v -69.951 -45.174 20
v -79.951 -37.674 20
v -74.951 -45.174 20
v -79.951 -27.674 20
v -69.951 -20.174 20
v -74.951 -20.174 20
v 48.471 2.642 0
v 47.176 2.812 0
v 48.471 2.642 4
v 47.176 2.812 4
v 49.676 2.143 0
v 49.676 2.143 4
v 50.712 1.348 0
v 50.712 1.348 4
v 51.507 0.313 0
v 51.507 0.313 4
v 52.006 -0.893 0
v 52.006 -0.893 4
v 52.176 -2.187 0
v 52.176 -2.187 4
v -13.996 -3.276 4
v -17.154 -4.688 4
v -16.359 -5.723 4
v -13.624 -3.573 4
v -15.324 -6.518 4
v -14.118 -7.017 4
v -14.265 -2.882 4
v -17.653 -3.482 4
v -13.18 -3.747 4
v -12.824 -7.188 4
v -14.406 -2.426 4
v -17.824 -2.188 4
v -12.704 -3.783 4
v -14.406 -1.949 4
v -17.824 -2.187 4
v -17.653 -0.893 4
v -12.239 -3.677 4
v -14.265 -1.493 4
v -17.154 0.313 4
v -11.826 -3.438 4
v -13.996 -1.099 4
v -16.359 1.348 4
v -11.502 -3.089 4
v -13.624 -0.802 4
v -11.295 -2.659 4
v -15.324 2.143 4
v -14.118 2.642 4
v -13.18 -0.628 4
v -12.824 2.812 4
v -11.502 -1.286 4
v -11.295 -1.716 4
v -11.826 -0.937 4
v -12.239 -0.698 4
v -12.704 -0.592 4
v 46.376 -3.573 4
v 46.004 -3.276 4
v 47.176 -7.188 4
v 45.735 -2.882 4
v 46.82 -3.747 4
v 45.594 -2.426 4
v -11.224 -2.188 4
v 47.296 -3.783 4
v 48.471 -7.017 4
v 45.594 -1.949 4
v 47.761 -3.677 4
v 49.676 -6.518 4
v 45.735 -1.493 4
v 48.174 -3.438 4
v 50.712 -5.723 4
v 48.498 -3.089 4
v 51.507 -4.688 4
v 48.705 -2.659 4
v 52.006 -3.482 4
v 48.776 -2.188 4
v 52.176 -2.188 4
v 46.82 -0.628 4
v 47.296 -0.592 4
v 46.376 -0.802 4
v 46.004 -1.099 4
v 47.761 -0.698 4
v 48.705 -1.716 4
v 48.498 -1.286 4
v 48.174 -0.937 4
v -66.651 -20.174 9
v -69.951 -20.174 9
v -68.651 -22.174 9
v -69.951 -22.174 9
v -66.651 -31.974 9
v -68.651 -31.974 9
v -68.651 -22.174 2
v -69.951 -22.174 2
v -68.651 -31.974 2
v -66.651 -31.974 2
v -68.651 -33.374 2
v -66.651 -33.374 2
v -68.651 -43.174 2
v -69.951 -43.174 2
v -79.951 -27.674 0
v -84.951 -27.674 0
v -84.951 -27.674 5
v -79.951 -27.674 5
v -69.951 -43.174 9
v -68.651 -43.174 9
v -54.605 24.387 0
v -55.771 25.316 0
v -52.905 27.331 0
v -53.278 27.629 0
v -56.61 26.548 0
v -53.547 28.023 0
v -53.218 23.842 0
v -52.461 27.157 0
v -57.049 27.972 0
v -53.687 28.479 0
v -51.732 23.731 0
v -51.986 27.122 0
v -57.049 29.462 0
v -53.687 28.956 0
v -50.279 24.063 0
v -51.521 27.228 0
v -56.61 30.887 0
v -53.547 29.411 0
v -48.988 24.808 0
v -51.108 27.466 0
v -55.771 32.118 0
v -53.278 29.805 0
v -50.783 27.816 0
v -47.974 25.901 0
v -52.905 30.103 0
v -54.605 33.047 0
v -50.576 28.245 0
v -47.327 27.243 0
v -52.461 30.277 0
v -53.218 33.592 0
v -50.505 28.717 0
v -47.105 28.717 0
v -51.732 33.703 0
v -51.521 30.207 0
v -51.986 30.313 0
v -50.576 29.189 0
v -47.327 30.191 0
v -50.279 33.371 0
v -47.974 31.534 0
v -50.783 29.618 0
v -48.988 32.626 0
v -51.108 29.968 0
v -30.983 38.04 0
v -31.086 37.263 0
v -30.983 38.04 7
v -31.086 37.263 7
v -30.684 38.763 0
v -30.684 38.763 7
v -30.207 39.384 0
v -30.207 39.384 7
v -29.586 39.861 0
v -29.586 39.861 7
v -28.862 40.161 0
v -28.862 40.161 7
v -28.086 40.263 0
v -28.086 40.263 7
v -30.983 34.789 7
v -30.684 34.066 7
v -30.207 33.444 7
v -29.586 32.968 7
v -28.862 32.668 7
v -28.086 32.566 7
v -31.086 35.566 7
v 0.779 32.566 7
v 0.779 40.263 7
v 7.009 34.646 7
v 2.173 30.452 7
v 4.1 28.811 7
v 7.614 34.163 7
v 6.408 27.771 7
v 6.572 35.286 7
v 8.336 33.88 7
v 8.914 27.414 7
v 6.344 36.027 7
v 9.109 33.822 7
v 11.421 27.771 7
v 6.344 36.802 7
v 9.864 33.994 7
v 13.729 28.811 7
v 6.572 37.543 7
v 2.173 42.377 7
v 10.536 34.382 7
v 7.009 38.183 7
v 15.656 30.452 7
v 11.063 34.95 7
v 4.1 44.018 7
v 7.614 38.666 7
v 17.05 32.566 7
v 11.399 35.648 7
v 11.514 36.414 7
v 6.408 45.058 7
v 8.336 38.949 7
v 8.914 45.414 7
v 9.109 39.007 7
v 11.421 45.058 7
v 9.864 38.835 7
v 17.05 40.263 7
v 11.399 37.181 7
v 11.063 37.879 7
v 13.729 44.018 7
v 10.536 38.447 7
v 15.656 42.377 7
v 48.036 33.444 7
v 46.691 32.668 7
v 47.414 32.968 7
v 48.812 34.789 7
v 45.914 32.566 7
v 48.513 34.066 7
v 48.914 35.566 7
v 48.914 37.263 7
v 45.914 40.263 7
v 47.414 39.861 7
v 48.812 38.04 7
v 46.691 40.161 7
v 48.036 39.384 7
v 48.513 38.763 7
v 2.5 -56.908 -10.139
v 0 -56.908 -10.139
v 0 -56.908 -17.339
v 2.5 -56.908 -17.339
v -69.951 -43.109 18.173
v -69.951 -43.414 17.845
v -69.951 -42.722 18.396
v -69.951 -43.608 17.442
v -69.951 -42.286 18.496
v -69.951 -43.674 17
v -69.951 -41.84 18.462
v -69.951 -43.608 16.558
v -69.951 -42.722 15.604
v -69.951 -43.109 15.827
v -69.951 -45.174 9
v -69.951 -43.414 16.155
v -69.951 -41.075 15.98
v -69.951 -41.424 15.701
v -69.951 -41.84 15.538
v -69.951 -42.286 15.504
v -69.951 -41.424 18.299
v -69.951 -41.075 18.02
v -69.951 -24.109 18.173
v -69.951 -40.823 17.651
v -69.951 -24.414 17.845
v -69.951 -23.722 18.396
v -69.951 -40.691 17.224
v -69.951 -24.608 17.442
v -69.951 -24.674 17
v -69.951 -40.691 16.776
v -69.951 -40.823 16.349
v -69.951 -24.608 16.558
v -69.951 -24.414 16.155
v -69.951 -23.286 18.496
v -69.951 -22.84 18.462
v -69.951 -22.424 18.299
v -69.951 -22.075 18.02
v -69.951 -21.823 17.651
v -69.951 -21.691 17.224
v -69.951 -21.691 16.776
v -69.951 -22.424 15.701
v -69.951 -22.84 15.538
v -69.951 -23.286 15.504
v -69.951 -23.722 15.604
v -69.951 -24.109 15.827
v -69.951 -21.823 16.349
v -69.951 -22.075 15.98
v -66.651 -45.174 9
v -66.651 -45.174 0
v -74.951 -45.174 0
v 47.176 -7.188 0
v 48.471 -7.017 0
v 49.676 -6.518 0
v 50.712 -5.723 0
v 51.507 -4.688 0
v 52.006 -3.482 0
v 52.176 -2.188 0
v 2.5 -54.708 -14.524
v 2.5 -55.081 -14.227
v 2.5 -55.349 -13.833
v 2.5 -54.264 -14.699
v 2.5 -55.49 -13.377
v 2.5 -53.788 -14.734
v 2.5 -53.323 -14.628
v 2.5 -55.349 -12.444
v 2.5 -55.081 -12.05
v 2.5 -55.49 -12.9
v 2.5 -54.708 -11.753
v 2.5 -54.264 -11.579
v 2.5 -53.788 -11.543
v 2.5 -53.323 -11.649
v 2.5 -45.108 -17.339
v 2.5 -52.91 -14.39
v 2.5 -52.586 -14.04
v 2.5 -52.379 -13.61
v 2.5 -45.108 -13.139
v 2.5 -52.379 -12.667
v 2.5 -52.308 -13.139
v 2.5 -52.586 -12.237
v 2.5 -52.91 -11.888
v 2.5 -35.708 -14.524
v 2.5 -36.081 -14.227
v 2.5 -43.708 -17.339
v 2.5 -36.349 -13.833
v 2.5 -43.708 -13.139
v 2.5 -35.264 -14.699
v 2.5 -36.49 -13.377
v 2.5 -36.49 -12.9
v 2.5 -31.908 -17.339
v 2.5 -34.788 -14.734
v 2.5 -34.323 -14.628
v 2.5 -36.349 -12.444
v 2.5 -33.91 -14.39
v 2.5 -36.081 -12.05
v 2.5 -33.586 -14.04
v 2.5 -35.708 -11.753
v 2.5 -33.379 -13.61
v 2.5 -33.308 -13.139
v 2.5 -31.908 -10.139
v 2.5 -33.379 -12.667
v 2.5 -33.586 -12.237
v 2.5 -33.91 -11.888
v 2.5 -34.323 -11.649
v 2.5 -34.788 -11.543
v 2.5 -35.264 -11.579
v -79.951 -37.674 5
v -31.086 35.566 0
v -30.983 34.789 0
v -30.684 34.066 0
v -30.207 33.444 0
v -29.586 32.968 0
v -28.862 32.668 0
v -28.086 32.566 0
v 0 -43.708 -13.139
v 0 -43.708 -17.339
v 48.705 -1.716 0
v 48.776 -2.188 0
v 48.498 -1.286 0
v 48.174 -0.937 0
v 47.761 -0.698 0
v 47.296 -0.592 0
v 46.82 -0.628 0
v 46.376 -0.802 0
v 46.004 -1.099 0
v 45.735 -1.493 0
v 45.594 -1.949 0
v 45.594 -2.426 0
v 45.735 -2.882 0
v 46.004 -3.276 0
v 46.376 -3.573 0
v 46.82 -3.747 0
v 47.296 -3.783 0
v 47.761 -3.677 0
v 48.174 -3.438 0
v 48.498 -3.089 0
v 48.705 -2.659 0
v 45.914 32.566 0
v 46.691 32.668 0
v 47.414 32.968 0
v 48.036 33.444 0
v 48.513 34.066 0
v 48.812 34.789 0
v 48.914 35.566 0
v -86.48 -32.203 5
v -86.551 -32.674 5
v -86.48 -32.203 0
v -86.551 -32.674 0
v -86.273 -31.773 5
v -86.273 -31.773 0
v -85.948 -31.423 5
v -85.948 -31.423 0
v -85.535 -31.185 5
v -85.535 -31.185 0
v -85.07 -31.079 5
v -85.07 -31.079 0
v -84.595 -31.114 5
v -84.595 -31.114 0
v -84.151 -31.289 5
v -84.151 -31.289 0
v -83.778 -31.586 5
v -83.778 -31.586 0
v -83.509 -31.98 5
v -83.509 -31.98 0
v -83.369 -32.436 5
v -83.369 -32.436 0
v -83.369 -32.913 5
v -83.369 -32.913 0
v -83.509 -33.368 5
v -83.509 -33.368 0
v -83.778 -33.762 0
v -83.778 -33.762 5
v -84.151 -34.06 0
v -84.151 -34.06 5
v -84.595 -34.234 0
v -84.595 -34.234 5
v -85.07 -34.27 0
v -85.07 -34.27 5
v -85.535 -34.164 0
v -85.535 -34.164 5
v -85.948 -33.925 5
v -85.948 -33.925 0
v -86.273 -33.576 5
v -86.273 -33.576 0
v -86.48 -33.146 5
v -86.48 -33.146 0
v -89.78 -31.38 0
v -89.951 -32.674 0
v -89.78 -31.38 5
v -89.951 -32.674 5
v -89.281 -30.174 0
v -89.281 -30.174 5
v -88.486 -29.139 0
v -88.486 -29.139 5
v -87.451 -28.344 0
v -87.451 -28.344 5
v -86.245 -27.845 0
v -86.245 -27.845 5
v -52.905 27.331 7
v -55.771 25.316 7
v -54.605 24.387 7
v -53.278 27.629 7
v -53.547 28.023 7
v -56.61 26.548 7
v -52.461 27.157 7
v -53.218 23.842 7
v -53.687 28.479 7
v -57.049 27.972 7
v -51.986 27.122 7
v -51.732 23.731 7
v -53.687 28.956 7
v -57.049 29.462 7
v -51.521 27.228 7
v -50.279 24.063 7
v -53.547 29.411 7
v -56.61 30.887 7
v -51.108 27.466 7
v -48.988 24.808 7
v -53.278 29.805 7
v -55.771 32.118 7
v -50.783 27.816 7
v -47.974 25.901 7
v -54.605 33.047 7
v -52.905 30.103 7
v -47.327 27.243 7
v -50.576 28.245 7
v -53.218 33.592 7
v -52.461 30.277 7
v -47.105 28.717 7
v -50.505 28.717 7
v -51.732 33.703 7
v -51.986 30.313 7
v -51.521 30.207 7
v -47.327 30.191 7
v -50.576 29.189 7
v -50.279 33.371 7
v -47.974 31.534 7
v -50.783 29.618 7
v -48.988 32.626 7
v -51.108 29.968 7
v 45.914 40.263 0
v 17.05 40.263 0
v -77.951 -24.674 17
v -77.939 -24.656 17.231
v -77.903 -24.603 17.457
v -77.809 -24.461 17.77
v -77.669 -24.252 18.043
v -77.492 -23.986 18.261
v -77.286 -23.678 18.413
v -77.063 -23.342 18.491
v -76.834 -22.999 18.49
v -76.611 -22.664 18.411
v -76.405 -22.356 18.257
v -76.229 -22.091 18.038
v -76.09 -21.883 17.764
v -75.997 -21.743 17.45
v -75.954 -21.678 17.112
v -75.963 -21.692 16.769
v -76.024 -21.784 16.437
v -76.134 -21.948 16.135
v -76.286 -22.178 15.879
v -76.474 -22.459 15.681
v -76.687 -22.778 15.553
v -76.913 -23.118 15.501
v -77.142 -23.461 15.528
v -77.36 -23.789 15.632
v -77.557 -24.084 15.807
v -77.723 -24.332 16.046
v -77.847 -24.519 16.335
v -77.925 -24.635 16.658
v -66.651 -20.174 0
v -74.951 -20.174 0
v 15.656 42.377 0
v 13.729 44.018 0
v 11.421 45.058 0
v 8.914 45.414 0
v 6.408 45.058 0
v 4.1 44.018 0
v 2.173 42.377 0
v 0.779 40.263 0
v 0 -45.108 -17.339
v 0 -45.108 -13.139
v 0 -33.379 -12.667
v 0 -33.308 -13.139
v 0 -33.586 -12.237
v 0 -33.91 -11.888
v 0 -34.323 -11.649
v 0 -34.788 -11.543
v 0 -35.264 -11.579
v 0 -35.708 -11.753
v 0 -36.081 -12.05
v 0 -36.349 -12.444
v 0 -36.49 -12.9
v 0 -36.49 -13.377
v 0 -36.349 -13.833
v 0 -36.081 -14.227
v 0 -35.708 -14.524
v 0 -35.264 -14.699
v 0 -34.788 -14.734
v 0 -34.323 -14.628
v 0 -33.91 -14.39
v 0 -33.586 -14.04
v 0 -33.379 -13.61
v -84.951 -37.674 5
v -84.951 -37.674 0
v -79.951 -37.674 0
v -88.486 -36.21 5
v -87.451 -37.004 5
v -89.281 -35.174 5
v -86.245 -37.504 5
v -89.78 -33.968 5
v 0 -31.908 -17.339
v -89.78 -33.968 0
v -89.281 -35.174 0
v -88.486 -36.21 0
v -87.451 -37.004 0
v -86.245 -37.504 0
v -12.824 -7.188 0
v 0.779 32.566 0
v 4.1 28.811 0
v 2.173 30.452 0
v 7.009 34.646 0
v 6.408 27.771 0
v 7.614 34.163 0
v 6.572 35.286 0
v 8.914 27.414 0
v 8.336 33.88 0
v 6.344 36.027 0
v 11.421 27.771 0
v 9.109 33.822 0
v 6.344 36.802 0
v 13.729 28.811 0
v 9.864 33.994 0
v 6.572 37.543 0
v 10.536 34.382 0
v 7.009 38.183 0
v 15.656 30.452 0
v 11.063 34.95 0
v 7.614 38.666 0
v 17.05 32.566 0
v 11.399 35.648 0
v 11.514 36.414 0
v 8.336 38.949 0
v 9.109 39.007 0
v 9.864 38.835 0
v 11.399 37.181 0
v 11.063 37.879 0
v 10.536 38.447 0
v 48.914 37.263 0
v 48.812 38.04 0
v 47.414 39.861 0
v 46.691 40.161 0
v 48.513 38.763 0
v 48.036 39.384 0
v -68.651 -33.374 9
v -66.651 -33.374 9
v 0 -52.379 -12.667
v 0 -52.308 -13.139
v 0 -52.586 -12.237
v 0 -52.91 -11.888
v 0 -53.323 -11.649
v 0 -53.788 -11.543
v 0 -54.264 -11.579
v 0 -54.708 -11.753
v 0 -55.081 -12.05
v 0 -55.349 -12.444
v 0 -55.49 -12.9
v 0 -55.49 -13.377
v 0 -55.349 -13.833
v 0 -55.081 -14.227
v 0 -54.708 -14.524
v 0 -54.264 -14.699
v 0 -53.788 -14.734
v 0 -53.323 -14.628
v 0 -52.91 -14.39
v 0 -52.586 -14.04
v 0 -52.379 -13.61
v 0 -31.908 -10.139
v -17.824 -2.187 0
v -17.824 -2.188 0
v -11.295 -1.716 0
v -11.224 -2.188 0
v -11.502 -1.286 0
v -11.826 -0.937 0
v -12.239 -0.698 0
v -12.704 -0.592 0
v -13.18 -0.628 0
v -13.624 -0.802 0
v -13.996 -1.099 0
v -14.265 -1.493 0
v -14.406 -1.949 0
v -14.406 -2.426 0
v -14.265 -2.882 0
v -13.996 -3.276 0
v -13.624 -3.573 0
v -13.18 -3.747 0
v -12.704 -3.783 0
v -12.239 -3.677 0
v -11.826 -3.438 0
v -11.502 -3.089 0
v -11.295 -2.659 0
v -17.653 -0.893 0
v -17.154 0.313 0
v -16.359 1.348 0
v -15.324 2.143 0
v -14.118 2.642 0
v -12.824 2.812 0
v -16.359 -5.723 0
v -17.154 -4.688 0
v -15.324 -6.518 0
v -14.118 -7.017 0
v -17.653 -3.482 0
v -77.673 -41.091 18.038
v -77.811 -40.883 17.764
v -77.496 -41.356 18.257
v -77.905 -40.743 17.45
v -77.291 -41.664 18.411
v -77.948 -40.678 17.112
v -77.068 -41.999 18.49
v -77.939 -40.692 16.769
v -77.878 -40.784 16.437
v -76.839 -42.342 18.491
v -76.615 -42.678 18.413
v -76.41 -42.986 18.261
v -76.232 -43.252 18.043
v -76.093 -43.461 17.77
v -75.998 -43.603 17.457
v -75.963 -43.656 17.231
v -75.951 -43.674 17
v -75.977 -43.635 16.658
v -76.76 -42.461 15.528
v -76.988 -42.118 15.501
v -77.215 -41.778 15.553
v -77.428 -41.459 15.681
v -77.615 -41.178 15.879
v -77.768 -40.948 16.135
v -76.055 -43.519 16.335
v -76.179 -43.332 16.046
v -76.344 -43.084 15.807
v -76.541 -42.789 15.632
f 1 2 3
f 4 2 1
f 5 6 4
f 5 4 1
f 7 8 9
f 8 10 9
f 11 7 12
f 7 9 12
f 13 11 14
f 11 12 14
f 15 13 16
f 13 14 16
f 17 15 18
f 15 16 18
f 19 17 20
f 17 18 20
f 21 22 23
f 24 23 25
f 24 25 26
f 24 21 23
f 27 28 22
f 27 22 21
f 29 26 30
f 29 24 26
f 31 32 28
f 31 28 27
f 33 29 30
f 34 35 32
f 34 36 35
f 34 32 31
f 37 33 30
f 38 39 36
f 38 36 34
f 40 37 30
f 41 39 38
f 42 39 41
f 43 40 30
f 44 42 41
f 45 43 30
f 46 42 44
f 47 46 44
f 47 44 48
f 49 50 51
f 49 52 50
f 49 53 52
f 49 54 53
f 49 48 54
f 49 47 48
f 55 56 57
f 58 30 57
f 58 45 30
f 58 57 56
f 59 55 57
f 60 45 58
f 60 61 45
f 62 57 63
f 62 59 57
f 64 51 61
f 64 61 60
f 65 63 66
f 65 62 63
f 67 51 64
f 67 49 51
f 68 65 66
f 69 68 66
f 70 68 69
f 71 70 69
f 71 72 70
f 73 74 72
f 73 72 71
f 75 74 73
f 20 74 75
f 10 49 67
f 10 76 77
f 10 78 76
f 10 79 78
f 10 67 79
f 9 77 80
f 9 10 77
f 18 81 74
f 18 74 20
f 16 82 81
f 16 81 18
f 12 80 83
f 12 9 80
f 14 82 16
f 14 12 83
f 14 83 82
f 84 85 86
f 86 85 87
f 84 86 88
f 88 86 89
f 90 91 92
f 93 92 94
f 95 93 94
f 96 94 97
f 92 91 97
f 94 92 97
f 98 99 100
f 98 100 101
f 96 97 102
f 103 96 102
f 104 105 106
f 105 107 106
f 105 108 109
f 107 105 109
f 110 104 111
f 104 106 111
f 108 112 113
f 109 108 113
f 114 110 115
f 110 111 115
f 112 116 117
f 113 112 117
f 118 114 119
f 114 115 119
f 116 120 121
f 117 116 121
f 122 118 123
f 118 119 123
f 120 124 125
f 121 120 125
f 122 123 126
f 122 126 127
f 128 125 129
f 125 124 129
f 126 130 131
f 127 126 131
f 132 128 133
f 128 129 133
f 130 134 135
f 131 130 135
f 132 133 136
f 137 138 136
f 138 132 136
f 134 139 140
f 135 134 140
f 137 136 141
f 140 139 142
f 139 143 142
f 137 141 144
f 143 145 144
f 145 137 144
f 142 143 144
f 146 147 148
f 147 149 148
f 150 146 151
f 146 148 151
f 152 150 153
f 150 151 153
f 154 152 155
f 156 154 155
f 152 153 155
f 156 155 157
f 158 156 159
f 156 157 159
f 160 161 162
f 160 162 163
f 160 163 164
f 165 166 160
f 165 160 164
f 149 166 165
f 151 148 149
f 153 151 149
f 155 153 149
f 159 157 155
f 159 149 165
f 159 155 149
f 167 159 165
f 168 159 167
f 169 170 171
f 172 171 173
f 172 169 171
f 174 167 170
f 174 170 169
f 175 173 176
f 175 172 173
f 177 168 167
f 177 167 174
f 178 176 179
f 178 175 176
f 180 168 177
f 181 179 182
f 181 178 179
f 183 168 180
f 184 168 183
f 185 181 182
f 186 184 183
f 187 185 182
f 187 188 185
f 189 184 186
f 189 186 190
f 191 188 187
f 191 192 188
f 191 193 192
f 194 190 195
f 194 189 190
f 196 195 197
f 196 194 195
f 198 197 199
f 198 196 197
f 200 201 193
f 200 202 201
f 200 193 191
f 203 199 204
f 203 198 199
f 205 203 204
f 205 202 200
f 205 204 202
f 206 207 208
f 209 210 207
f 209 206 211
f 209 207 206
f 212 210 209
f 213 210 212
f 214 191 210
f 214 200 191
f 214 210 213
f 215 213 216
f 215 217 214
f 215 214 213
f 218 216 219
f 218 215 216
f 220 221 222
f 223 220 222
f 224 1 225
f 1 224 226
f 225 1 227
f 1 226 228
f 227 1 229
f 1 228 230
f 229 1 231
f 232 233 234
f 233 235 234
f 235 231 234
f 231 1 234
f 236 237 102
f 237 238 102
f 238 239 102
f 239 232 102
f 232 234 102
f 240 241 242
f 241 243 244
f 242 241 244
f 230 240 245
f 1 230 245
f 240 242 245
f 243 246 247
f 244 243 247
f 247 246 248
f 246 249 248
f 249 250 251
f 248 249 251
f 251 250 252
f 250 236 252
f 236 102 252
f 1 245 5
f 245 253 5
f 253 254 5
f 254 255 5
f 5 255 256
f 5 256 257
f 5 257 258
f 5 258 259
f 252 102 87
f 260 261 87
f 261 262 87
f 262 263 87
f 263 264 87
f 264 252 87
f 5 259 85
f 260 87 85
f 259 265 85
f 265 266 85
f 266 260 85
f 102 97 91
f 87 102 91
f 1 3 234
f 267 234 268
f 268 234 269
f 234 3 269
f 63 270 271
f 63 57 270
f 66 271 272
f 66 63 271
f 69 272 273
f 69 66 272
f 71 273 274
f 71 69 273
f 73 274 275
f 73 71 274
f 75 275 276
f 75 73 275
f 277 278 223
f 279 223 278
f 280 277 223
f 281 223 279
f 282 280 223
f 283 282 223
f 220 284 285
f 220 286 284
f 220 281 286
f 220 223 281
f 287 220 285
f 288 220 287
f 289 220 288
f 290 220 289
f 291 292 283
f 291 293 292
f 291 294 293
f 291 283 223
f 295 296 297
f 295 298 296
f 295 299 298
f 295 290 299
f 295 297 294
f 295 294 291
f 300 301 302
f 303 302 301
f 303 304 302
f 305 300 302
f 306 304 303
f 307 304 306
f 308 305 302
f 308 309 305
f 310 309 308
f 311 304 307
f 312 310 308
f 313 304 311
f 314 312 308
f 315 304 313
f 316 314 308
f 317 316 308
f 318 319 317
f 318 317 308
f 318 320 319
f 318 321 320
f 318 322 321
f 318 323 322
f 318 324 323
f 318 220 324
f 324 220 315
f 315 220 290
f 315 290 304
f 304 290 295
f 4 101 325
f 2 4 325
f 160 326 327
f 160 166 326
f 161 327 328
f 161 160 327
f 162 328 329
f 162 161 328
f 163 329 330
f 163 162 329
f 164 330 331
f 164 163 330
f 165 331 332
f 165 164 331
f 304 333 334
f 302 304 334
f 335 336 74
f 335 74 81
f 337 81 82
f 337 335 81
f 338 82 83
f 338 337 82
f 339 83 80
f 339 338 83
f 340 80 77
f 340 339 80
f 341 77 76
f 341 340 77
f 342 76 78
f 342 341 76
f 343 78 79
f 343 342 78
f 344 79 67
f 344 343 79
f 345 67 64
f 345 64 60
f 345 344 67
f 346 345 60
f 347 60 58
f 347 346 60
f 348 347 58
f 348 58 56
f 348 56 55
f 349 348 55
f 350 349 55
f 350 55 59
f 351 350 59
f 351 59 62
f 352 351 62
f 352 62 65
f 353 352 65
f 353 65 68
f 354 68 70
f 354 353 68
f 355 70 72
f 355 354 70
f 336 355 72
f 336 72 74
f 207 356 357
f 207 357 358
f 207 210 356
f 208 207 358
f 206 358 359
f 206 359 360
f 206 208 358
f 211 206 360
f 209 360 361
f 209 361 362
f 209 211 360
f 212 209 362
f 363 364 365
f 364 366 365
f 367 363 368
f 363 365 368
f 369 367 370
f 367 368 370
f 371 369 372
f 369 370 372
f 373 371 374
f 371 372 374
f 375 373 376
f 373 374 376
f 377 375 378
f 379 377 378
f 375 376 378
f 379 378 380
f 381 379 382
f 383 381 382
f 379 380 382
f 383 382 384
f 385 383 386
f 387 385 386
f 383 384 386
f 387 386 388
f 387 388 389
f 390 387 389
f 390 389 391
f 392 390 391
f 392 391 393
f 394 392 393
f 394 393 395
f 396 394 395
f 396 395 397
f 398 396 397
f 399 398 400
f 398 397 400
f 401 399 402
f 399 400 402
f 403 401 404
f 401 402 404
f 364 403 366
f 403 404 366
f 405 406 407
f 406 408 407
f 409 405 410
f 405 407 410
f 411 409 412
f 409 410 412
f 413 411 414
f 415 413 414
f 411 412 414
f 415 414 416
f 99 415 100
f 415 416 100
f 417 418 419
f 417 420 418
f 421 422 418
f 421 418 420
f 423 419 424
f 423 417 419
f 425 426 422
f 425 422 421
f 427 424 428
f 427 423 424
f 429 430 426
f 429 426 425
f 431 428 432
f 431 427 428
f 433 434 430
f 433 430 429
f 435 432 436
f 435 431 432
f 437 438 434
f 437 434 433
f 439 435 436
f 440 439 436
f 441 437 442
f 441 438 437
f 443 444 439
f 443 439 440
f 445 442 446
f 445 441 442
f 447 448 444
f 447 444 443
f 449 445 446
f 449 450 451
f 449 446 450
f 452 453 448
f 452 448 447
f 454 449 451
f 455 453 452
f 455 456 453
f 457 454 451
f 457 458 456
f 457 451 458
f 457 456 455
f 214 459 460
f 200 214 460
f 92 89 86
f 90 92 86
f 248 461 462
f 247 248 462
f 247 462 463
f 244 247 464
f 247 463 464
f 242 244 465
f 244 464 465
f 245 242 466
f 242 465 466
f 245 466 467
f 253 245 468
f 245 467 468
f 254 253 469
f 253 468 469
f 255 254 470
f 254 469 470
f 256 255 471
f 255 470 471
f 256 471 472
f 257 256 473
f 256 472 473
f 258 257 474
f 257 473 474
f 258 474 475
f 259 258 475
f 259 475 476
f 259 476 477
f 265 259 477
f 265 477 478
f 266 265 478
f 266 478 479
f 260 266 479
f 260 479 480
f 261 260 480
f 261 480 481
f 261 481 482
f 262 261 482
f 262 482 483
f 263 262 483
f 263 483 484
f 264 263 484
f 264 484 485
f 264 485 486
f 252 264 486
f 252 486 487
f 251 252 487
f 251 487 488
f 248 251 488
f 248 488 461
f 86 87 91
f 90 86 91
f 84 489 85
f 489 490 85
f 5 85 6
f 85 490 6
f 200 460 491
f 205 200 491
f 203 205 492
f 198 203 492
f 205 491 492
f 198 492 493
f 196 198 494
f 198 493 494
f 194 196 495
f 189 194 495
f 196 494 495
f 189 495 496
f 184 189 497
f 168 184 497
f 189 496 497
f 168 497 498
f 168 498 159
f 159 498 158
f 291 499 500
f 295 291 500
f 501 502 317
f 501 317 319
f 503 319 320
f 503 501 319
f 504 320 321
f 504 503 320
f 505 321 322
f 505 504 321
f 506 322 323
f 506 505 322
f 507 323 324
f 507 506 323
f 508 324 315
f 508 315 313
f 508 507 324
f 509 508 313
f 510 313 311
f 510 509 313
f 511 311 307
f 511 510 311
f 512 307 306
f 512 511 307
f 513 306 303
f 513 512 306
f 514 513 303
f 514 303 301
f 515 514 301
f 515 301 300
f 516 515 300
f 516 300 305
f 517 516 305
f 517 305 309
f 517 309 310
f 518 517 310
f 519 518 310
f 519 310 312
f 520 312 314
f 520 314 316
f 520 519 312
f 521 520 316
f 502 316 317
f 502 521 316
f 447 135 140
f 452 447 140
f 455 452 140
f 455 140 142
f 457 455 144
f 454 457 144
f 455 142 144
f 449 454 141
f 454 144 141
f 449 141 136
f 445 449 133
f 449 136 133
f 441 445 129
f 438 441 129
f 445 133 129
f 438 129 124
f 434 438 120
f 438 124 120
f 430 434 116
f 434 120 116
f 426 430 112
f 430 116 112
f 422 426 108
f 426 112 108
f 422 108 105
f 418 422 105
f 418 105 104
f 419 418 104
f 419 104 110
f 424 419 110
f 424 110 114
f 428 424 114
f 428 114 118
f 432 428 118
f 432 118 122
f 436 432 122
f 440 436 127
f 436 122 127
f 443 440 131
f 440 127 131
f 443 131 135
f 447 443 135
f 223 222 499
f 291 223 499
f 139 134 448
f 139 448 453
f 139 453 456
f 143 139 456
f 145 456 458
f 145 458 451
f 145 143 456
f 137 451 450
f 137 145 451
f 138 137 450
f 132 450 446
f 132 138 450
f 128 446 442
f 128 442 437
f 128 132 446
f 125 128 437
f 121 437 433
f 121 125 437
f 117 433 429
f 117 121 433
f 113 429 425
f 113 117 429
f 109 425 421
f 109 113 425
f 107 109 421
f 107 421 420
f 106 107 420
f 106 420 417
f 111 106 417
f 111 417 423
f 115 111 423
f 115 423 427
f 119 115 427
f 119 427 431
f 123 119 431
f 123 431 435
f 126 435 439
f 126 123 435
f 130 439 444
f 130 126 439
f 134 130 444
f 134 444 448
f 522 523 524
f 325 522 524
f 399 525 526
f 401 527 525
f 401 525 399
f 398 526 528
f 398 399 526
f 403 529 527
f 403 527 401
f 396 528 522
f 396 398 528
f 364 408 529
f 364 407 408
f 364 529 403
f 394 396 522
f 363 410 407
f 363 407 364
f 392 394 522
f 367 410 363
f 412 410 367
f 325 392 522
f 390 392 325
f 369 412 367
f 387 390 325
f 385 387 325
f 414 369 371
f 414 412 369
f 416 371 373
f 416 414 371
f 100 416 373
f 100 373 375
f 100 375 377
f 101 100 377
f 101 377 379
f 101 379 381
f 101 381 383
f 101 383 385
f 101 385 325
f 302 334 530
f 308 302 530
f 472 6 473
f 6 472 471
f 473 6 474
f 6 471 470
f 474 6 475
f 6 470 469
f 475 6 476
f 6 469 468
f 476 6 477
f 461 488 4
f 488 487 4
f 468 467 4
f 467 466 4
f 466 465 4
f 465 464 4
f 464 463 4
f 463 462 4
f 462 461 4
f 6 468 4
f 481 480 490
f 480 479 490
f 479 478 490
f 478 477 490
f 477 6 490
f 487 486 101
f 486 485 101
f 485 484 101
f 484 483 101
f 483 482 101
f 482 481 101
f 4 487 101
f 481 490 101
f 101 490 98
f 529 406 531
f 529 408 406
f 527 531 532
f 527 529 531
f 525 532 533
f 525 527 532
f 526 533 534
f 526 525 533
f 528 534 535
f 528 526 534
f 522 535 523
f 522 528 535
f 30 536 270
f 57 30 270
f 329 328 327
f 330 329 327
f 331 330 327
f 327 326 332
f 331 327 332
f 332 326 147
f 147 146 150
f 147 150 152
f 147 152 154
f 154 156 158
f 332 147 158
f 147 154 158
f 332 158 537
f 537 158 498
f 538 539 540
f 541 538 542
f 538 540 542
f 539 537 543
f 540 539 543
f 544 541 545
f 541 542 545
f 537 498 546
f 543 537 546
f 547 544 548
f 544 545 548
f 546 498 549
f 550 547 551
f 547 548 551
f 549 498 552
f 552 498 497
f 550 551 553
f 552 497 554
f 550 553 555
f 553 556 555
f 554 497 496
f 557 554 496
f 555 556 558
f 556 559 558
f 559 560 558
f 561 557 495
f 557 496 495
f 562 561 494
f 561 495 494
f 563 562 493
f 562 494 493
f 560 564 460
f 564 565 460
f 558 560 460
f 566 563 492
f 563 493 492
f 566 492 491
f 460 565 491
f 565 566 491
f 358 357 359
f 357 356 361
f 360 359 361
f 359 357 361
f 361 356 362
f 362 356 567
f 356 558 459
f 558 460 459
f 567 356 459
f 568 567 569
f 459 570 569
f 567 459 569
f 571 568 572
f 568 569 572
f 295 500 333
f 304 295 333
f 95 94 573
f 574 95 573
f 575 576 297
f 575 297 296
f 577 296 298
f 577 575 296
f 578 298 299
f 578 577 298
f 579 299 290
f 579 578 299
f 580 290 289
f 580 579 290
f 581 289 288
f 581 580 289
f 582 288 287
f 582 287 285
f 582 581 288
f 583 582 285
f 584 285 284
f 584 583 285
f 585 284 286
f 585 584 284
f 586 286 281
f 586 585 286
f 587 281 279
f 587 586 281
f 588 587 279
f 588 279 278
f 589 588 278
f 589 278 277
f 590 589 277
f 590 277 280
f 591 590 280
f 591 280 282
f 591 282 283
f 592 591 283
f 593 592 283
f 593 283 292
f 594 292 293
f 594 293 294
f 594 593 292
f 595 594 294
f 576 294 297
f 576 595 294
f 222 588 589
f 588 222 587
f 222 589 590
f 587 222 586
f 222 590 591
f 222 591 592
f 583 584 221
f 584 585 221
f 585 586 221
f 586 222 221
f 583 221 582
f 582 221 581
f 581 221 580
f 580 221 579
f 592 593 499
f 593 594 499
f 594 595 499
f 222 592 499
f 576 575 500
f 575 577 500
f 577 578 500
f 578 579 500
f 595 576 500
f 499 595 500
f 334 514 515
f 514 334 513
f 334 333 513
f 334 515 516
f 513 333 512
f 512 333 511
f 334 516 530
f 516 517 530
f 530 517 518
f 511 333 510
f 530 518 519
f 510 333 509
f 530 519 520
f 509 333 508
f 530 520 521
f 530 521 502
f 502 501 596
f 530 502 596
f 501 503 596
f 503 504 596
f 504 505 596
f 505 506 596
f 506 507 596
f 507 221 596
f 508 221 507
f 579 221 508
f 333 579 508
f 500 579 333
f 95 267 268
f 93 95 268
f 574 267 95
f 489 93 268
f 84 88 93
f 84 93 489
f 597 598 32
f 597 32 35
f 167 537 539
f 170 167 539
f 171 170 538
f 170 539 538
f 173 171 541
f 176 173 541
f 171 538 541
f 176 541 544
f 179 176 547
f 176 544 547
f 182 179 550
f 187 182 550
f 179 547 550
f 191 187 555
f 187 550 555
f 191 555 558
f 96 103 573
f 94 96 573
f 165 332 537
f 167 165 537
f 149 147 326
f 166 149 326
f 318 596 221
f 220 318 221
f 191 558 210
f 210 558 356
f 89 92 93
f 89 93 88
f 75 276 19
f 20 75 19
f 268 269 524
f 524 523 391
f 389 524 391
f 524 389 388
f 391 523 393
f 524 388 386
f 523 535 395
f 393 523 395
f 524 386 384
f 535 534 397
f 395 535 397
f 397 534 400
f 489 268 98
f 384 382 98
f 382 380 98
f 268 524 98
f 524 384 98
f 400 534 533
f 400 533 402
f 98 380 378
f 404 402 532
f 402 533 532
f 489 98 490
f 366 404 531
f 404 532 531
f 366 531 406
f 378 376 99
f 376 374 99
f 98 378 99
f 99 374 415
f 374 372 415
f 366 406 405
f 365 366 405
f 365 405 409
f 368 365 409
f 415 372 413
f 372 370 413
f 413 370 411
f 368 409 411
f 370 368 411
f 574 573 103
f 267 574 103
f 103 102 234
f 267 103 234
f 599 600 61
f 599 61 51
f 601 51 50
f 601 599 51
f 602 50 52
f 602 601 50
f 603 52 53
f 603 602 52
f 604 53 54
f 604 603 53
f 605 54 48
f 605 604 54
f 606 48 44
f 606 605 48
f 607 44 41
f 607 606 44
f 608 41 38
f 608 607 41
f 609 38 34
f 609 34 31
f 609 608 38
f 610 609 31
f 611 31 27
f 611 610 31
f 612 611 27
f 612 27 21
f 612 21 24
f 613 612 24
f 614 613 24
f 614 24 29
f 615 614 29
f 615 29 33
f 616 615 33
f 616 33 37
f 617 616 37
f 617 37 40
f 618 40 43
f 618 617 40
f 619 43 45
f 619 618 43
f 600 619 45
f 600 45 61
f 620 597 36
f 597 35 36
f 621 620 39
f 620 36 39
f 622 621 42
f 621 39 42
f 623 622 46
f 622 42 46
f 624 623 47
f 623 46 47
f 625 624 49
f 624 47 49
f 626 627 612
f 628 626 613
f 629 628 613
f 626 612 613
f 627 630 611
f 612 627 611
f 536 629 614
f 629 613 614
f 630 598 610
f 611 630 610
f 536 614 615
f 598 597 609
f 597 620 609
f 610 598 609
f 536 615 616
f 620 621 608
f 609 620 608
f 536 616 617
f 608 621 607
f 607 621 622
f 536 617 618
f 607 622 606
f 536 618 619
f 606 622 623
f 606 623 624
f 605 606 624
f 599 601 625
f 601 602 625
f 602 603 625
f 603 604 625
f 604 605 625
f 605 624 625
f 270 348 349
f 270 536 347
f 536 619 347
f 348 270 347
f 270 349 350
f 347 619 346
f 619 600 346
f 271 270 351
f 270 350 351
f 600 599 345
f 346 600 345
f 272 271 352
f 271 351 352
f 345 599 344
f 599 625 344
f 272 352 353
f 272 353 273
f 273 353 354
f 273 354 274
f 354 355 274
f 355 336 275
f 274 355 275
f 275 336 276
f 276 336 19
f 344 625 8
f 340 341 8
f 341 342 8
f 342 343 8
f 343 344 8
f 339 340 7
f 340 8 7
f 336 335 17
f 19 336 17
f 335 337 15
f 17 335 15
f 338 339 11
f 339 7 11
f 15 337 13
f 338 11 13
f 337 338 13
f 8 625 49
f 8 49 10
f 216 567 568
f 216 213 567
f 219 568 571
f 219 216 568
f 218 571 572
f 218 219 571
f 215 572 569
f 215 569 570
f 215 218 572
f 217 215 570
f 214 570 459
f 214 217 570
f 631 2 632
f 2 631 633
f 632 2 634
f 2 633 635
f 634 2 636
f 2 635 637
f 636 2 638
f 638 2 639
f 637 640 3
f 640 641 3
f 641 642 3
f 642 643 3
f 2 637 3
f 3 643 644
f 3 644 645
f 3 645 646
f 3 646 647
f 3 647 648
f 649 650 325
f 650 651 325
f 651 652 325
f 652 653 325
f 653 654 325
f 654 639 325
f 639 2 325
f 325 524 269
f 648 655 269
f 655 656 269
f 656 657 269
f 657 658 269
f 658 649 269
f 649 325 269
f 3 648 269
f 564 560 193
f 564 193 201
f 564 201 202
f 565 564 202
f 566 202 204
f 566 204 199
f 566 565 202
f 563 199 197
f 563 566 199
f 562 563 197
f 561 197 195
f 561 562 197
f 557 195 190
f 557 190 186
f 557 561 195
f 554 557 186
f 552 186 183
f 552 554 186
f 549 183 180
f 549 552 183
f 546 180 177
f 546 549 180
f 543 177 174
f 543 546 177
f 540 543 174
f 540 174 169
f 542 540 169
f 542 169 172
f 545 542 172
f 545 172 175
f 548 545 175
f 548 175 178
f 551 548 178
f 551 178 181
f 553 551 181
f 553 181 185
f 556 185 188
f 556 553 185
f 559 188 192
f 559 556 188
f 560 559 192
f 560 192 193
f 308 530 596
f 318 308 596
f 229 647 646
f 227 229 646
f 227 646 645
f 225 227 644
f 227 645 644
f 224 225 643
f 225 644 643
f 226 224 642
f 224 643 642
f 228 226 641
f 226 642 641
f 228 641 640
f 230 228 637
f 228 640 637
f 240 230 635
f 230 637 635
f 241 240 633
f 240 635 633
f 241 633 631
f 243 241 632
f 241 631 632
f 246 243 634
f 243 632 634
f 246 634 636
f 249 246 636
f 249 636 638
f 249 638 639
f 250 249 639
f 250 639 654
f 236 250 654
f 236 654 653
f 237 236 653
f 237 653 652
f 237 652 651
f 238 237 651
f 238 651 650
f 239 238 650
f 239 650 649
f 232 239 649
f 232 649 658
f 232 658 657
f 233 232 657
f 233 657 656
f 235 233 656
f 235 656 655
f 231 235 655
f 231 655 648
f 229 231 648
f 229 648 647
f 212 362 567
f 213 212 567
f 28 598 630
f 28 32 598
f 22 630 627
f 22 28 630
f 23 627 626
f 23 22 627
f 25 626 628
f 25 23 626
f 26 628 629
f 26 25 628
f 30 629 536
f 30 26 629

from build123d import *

# Parameters (mm, degrees)
F0_W      = 70
F0_H      = 10
F0_R      = 1.6
F1_DEPTH  = 4
F2_R      = 4.99999
F3_R      = 5
F3_R_2    = 1.6
F4_DEPTH  = 7
F7_DEPTH  = 20
F6_W      = 10
F6_H      = 10
F8_DEPTH  = 5
F10_D     = 3.2
F10_DEPTH = 5
F10_TIP   = 0.9613769904
F11_R     = 4.99999
F13_DEPTH = 1.3
F14_W     = 9.8
F14_H     = 7
F15_DEPTH = 2
F16_D     = 3
F16_DEPTH = 10
F16_TIP   = 0.9012909285
F17_R     = 1.6
F18_DEPTH = 2.5
F5_R      = 2.6
F19_DEPTH = 7
F20_R     = 3


# Not quite as in the source:
# - a fillet or chamfer is up to 0.001 mm smaller than in the source, because OpenCascade refuses the exact size


with BuildPart() as f1:
    # F0 (on Top) → F1 (new body)
    with BuildSketch(Plane.XY):
        with Locations((17.1764425881, -2.1875003539)):
            Rectangle(F0_W, F0_H)
        with Locations((-12.8235574119, -2.1875003539)):
            Circle(F0_R, mode=Mode.SUBTRACT)
        with Locations((47.1764425881, -2.1875003539)):
            Circle(F0_R, mode=Mode.SUBTRACT)
    extrude(amount=F1_DEPTH)

    # F2 (radius 5 in the source; OpenCascade refuses exactly that, so slightly less here)
    f2_edges = [f1.edges().sort_by_distance(p)[0] for p in [
        (-17.823557, 2.8125, 2),
        (-17.823557, -7.1875, 2),
        (52.176443, 2.8125, 2),
        (52.176443, -7.1875, 2),
    ]]
    fillet(f2_edges, radius=F2_R)


with BuildPart() as f4:
    # F3 (on Top) → F4 (new body)
    with BuildSketch(Plane.XY):
        with Locations((-52.1052666008, 28.7171080709)):
            Circle(F3_R)
        with Locations((-52.1052666008, 28.7171080709)):
            Circle(F3_R_2, mode=Mode.SUBTRACT)
    extrude(amount=F4_DEPTH)


with BuildPart() as f7:
    # F6 (on Top) → F7 (new body)
    with BuildSketch(Plane.XY):
        Polygon((-74.9508264661, -20.1742056012), (-79.9508264661, -27.6742056012), (-79.9508264661, -37.6742056012), (-74.9508264661, -45.1742056012), (-69.9508264661, -45.1742056012), (-69.9508264661, -20.1742056012), align=None)
    extrude(amount=F7_DEPTH)

    # F6 (on Top) → F8 (join)
    with BuildSketch(Plane.XY):
        with Locations((-84.9508264661, -32.6742056012)):
            Rectangle(F6_W, F6_H)
    extrude(amount=F8_DEPTH)

    # F10
    with Locations(Plane.XY.offset(5)):
        with Locations((-84.9508264661, -32.6742056012)):
            Hole(F10_D / 2, depth=F10_DEPTH)
            with Locations((0, 0, -(F10_DEPTH + F10_TIP / 2))):  # 118° drill point
                Cone(0, F10_D / 2, F10_TIP, mode=Mode.SUBTRACT)

    # F11 (radius 5 in the source; OpenCascade refuses exactly that, so slightly less here)
    f11_edges = [f7.edges().sort_by_distance(p)[0] for p in [
        (-89.950826, -37.674206, 2.5),
        (-89.950826, -27.674206, 2.5),
    ]]
    fillet(f11_edges, radius=F11_R)

    # F12 (on face) → F13 (join)
    with BuildSketch(Plane.YZ.offset(-69.9508264661)):
        Polygon((-43.1742056012, 9), (-45.1742056012, 9), (-45.1742056012, 0), (-20.1742056012, 0), (-20.1742056012, 9), (-22.1742056012, 9), (-22.1742056012, 2), (-43.1742056012, 2), align=None)
    extrude(amount=F13_DEPTH)

    # F14 (on face) → F15 (join)
    with BuildSketch(Plane.YZ.offset(-68.6508264661)):
        Polygon((-43.1742056012, 9), (-45.1742056012, 9), (-45.1742056012, 0), (-20.1742056012, 0), (-20.1742056012, 9), (-22.1742056012, 9), (-22.1742056012, 2), (-31.9742056012, 2), (-33.3742056012, 2), (-43.1742056012, 2), align=None)
        with Locations((-38.2742056012, 5.5)):
            Rectangle(F14_W, F14_H)
        with Locations((-27.0742056012, 5.5)):
            Rectangle(F14_W, F14_H)
    extrude(amount=F15_DEPTH)

    # F16
    with Locations(Plane.YZ.offset(-69.9508264661)):
        with Locations((-42.1742056012, 17), (-23.1742056012, 17)):
            Hole(F16_D / 2, depth=F16_DEPTH)
            with Locations((0, 0, -(F16_DEPTH + F16_TIP / 2))):  # 118° drill point
                Cone(0, F16_D / 2, F16_TIP, mode=Mode.SUBTRACT)


with BuildPart() as f18:
    # F17 (on Right) → F18 (new body)
    with BuildSketch(Plane.YZ):
        Polygon((-31.9078966975, -10.1387043178), (-56.9078966975, -10.1387043178), (-56.9078966975, -17.3387043178), (-45.1078966975, -17.3387043178), (-45.1078966975, -13.1387043178), (-43.7078966975, -13.1387043178), (-43.7078966975, -17.3387043178), (-31.9078966975, -17.3387043178), align=None)
        with Locations((-53.9078966975, -13.1387043178)):
            Circle(F17_R, mode=Mode.SUBTRACT)
        with Locations((-34.9078966975, -13.1387043178)):
            Circle(F17_R, mode=Mode.SUBTRACT)
    extrude(amount=F18_DEPTH)


with BuildPart() as f19:
    # F5 (on Top) → F19 (new body)
    with BuildSketch(Plane.XY):
        with BuildLine():
            ThreePointArc((0.7788947706, 32.5657874346), (-0.0855284333, 36.4144742489), (0.7788947706, 40.2631610632))
            Line((0.7788947706, 40.2631610632), (-31.0855284333, 40.2631610632))
            Line((-31.0855284333, 40.2631610632), (-31.0855284333, 32.5657874346))
            Line((-31.0855284333, 32.5657874346), (0.7788947706, 32.5657874346))
        make_face()
        with BuildLine():
            ThreePointArc((17.0500483628, 32.5657874346), (17.6957069913, 34.4421901878), (17.9144715667, 36.4144742489))
            ThreePointArc((17.9144715667, 36.4144742489), (17.6957069913, 38.3867583099), (17.0500483628, 40.2631610632))
            Line((17.0500483628, 40.2631610632), (0.7788947706, 40.2631610632))
            ThreePointArc((0.7788947706, 40.2631610632), (-0.0855284333, 36.4144742489), (0.7788947706, 32.5657874346))
            Line((0.7788947706, 32.5657874346), (17.0500483628, 32.5657874346))
        make_face()
        with Locations((8.9144715667, 36.4144742489)):
            Circle(F5_R, mode=Mode.SUBTRACT)
        with BuildLine():
            Line((0.7788947706, 40.2631610632), (17.0500483628, 40.2631610632))
            ThreePointArc((17.0500483628, 40.2631610632), (8.9144715667, 45.4144742489), (0.7788947706, 40.2631610632))
        make_face()
        with BuildLine():
            ThreePointArc((0.7788947706, 32.5657874346), (8.9144715667, 27.4144742489), (17.0500483628, 32.5657874346))
            Line((17.0500483628, 32.5657874346), (0.7788947706, 32.5657874346))
        make_face()
        with BuildLine():
            ThreePointArc((17.0500483628, 40.2631610632), (17.6957069913, 38.3867583099), (17.9144715667, 36.4144742489))
            ThreePointArc((17.9144715667, 36.4144742489), (17.6957069913, 34.4421901878), (17.0500483628, 32.5657874346))
            Line((17.0500483628, 32.5657874346), (48.9144715667, 32.5657874346))
            Line((48.9144715667, 32.5657874346), (48.9144715667, 40.2631610632))
            Line((48.9144715667, 40.2631610632), (17.0500483628, 40.2631610632))
        make_face()
    extrude(amount=F19_DEPTH)

    # F20
    f20_edges = [f19.edges().sort_by_distance(p)[0] for p in [
        (-31.085528, 40.263161, 3.5),
        (-31.085528, 32.565787, 3.5),
        (48.914472, 40.263161, 3.5),
        (48.914472, 32.565787, 3.5),
    ]]
    fillet(f20_edges, radius=F20_R)


solid = Compound([f1.part, f4.part, f7.part, f18.part, f19.part])
